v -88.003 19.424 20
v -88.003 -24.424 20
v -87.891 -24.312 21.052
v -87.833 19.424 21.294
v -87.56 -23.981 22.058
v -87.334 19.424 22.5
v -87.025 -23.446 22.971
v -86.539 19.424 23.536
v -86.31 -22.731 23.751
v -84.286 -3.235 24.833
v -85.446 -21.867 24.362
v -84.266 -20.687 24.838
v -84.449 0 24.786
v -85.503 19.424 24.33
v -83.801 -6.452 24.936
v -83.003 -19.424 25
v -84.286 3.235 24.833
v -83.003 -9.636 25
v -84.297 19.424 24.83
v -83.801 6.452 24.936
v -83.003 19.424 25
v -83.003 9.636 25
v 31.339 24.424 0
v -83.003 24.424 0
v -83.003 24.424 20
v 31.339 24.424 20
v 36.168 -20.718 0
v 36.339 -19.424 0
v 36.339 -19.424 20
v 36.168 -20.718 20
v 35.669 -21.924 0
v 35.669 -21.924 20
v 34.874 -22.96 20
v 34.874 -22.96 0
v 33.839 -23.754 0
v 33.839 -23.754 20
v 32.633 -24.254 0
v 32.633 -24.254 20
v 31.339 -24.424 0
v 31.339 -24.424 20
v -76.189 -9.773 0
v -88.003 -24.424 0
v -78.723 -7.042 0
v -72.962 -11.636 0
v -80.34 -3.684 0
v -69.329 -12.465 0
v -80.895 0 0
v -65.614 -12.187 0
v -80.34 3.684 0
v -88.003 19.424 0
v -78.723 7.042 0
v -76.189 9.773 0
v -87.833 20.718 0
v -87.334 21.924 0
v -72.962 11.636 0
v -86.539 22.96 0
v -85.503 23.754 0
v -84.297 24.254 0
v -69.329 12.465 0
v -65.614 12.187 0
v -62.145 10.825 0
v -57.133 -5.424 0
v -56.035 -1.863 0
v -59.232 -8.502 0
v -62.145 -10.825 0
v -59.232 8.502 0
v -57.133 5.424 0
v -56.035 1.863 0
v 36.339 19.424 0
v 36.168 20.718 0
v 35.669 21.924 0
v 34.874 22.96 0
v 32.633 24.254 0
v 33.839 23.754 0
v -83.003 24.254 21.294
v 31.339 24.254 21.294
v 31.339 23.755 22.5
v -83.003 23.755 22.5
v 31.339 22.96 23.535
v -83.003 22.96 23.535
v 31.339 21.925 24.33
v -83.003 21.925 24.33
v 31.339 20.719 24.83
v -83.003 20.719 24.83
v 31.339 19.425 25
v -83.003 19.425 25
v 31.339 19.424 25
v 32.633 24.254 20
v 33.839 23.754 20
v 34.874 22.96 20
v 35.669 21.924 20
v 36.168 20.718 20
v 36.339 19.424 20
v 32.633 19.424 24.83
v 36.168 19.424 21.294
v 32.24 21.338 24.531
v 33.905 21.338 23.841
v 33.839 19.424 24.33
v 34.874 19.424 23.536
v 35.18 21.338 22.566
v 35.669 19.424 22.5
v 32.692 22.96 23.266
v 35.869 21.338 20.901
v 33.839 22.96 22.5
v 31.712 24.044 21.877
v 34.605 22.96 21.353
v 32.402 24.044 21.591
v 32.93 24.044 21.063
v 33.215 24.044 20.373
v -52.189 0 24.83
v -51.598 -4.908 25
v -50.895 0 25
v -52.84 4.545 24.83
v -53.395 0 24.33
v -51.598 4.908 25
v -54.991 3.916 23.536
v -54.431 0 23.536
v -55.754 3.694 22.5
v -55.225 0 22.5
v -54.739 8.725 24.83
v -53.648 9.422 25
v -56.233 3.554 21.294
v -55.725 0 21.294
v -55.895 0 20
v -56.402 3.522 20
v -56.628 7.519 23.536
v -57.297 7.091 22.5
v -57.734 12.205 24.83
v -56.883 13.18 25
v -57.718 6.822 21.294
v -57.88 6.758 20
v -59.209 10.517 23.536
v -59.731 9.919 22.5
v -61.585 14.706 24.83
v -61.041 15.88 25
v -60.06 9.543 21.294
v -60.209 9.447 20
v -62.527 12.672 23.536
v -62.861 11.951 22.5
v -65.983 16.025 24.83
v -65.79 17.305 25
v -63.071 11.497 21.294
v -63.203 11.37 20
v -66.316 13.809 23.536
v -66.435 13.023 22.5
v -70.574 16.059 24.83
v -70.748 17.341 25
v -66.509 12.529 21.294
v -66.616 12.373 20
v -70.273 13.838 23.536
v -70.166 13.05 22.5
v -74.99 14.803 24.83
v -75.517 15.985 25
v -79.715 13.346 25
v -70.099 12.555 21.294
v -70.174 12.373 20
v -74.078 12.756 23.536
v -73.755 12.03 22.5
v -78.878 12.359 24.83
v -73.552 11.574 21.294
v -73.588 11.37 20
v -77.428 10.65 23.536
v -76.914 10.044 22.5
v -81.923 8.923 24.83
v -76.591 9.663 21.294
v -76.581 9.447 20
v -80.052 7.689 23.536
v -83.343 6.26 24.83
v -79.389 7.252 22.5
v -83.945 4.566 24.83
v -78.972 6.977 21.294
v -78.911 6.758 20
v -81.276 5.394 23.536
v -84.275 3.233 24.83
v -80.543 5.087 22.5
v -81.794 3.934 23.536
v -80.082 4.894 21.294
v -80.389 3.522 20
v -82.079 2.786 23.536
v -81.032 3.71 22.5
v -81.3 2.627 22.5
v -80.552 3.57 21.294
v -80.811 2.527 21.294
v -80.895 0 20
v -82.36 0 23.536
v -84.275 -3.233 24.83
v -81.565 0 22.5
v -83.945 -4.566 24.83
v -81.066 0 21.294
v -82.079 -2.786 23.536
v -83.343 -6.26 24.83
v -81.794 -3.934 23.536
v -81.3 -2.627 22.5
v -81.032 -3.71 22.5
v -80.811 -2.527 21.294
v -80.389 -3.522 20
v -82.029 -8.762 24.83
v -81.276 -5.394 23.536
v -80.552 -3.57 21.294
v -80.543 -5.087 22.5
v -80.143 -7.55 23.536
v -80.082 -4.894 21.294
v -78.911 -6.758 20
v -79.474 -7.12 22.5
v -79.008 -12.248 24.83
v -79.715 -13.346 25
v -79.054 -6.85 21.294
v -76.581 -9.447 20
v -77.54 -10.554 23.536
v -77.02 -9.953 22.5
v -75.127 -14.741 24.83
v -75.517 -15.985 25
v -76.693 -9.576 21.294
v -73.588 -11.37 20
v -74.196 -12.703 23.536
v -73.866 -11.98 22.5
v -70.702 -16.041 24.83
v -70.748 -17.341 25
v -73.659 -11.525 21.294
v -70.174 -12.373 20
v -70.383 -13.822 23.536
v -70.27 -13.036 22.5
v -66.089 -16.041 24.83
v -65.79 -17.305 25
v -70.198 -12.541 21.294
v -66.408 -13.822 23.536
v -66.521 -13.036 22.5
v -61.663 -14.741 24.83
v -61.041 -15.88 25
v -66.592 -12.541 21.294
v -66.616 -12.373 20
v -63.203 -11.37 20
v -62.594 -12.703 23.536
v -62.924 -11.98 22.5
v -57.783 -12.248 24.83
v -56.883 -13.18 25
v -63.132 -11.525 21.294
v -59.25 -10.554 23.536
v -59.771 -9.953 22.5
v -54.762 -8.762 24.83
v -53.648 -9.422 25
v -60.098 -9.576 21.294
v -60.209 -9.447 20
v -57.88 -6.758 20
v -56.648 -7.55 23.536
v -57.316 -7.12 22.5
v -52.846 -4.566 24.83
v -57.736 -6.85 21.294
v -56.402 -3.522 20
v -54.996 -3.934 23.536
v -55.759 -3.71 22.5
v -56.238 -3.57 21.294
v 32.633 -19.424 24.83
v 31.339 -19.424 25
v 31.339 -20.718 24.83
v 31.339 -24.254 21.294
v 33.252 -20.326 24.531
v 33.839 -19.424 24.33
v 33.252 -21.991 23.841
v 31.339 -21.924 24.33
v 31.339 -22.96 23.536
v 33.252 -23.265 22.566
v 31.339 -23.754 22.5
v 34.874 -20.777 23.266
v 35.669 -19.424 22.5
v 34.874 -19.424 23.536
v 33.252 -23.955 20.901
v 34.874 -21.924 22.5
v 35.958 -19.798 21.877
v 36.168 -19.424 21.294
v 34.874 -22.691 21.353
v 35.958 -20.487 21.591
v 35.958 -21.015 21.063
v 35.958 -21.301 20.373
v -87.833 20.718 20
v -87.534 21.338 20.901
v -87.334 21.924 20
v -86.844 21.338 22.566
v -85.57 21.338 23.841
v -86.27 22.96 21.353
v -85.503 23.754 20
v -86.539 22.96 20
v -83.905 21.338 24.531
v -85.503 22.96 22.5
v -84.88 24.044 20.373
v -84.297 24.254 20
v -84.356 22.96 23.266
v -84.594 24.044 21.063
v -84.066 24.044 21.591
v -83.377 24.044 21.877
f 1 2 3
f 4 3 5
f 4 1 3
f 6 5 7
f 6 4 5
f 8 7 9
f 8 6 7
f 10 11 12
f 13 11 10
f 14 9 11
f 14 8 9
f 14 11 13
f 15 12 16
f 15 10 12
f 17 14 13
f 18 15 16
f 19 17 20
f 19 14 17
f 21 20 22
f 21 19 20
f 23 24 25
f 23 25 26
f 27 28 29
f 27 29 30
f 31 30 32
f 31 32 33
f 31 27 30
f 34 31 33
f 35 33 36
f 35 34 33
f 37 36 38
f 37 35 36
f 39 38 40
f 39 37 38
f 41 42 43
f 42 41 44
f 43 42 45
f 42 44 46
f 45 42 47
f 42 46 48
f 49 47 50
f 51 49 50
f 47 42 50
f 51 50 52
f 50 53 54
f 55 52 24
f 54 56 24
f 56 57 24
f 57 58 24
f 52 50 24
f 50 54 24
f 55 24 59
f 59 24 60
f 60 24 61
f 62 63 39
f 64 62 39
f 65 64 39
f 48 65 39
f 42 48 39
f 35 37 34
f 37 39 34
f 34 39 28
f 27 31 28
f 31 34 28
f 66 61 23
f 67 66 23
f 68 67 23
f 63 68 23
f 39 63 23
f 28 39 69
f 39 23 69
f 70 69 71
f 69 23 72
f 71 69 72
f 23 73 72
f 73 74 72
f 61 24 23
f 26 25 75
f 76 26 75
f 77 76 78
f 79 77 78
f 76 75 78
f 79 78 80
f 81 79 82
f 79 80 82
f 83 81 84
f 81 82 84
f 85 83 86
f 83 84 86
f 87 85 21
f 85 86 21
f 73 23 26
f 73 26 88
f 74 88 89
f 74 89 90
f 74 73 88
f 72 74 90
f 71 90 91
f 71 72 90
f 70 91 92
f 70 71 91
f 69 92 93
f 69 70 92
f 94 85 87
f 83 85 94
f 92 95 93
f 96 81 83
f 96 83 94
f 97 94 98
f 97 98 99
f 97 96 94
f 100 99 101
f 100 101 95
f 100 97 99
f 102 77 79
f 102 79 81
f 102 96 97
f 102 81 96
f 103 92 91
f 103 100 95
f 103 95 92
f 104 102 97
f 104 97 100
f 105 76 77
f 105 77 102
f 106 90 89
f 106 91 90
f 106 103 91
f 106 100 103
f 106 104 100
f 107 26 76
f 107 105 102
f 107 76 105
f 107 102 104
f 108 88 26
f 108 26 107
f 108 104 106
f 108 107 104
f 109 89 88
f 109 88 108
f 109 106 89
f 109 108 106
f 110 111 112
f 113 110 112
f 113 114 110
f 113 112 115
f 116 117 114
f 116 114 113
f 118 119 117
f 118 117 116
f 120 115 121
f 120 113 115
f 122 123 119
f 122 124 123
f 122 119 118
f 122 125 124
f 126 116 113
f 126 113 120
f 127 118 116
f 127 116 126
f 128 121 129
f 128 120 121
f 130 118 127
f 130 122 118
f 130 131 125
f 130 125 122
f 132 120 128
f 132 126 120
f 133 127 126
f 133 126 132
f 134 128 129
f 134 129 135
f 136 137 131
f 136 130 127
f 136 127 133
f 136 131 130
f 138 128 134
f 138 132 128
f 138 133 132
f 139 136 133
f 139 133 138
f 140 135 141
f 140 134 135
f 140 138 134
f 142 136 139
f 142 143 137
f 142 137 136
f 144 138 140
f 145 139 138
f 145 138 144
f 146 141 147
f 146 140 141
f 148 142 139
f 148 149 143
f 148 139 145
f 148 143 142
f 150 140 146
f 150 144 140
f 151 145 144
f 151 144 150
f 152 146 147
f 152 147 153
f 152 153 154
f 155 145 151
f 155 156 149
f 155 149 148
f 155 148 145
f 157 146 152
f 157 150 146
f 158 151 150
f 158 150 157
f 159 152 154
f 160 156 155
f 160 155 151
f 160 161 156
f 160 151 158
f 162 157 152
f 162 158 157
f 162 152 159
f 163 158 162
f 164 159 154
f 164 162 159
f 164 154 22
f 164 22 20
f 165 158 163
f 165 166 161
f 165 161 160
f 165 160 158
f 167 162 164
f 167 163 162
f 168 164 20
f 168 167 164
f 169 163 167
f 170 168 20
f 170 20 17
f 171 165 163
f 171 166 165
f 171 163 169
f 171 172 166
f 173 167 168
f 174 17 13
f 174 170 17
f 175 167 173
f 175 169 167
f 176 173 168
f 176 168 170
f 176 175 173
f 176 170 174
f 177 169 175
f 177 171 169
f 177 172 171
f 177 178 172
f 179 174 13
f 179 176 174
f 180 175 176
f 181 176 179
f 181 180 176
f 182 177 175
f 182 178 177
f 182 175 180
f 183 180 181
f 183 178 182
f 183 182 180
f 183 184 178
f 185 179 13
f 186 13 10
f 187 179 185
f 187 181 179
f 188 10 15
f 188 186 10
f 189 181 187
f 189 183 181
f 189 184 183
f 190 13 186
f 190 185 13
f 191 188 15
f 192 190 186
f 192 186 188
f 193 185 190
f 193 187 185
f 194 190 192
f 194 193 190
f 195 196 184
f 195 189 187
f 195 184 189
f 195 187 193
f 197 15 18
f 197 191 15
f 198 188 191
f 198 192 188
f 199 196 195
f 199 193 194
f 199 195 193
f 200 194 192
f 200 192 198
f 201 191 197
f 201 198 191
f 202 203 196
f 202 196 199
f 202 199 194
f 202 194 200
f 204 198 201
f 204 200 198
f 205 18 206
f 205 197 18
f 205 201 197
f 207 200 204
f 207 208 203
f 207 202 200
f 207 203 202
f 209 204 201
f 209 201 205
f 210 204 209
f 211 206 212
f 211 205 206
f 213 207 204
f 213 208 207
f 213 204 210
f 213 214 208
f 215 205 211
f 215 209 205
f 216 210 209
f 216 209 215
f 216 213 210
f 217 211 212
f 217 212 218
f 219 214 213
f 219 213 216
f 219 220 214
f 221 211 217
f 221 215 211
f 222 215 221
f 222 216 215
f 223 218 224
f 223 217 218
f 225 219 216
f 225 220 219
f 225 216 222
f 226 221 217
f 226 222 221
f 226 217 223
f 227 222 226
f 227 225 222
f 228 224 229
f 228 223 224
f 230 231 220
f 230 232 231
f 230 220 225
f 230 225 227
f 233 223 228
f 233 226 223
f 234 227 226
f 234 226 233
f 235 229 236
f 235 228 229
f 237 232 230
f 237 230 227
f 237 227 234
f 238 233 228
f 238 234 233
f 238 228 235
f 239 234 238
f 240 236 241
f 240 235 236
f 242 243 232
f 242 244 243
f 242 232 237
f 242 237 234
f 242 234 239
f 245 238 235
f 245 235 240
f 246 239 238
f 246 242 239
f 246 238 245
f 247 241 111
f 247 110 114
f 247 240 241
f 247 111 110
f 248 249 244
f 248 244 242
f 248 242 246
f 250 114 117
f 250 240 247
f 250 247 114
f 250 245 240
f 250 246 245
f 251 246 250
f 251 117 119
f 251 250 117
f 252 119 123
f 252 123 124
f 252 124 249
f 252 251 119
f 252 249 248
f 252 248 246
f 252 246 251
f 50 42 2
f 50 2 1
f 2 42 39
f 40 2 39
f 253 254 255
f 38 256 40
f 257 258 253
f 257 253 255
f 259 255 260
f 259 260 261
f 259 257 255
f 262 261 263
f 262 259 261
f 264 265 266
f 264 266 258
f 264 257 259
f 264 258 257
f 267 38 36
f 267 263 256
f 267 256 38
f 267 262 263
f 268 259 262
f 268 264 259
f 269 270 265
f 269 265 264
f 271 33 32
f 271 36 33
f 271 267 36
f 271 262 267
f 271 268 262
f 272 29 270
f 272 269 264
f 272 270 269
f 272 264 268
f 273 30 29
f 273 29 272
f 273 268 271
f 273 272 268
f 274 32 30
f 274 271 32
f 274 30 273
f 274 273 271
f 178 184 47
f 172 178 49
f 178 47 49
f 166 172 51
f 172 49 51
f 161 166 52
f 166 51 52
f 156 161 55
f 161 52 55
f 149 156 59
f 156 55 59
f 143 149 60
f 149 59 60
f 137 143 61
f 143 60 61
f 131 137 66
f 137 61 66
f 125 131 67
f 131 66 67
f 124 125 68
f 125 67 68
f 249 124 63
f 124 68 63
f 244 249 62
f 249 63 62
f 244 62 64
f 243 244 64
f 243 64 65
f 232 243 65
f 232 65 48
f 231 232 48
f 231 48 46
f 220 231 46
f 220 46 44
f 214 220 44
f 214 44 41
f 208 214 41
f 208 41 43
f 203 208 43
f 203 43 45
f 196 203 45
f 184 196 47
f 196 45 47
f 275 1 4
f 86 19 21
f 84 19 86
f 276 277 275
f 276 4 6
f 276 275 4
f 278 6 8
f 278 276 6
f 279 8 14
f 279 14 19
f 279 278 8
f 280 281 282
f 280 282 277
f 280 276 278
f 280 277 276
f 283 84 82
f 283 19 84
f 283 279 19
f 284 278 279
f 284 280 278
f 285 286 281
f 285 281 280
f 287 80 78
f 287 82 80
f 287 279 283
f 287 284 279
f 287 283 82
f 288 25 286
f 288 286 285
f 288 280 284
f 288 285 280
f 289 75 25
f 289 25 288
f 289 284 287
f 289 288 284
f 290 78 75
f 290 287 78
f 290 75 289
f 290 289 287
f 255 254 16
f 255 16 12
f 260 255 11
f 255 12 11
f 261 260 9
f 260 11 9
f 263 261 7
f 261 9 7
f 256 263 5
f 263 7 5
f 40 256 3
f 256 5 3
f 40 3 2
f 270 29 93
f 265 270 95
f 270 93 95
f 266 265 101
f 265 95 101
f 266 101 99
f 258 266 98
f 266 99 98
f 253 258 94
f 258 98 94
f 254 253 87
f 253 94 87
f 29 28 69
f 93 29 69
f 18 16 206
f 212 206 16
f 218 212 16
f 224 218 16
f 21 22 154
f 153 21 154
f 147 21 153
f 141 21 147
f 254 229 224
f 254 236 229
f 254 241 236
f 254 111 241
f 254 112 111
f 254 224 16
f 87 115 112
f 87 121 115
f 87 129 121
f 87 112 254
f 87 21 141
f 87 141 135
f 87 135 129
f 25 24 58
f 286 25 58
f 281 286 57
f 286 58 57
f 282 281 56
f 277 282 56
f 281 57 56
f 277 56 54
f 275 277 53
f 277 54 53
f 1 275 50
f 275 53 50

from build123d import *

# Parameters (mm, degrees)
F0_W         = 124.3421025574
F0_H         = 48.8486886024
F1_DEPTH     = 25
F3_D         = 25
F4_T1_DEPTH  = 149.3421025574
F4_T3_DEPTH  = 73.8486886024
F5_T1_DEPTH  = 32.5
F5_S5_W      = 5
F5_S5_H      = 5
F5_T6_DEPTH  = 5
F6_T1_DEPTH  = 32.5
F6_S5_W      = 5
F6_S5_H      = 5
F6_T6_DEPTH  = 5
F6_S11_W     = 5
F6_S11_H     = 5
F6_T12_DEPTH = 5


# Not quite as in the source:
# - a fillet or chamfer that OpenCascade refuses, or shapes differently, is made with other operations: its cross-section is extruded or revolved along the edge and cut away or added


with BuildPart() as f1:
    # F0 (on Top) → F1 (new body)
    with BuildSketch(Plane.XY):
        with Locations((-25.8323382586, 0)):
            Rectangle(F0_W, F0_H)
    extrude(amount=F1_DEPTH)

    # F3 (through all)
    with Locations(Plane.XY.offset(25)):
        with Locations((-68.3952495456, 0)):
            Hole(F3_D / 2)

    # F4: fillet of radius 5 on 5 edges, made by hand

    # F4_s2 → F4_t1 (cut)
    with BuildSketch(Plane.YZ.offset(-100.5033895373)):
        with BuildLine():
            ThreePointArc((24.4243443012, 20), (22.9598782072, 23.5355339059), (19.4243443012, 25))
            Line((19.4243443012, 25), (24.4243443012, 25))
            Line((24.4243443012, 25), (24.4243443012, 20))
        make_face()
        with BuildLine():
            ThreePointArc((-19.4243443012, 25), (-22.9598782072, 23.5355339059), (-24.4243443012, 20))
            Line((-24.4243443012, 20), (-24.4243443012, 25))
            Line((-24.4243443012, 25), (-19.4243443012, 25))
        make_face()
    extrude(amount=F4_T1_DEPTH, mode=Mode.SUBTRACT)

    # F4_s4 → F4_t3 (cut)
    with BuildSketch(Plane.XZ.offset(-36.9243443012)):
        with BuildLine():
            ThreePointArc((36.3387130201, 20), (34.874246926, 23.5355339059), (31.3387130201, 25))
            Line((31.3387130201, 25), (36.3387130201, 25))
            Line((36.3387130201, 25), (36.3387130201, 20))
        make_face()
        with BuildLine():
            ThreePointArc((-88.0033895373, 20), (-86.5389234433, 23.5355339059), (-83.0033895373, 25))
            Line((-83.0033895373, 25), (-88.0033895373, 25))
            Line((-88.0033895373, 25), (-88.0033895373, 20))
        make_face()
    extrude(amount=F4_T3_DEPTH, mode=Mode.SUBTRACT)

    # F4_s5 → F4_t6 (revolve, cut)
    with BuildSketch(Plane.XZ):
        with BuildLine():
            ThreePointArc((-50.8952495456, 25), (-54.4307834515, 23.5355339059), (-55.8952495456, 20))
            Line((-55.8952495456, 20), (-55.8952495456, 25))
            Line((-55.8952495456, 25), (-50.8952495456, 25))
        make_face()
    revolve(axis=Axis((-68.3952495456, 0, 25), (0, 0, 1)), mode=Mode.SUBTRACT)

    # F5: fillet of radius 5 on 1 edges, made by hand

    # F5_s2 → F5_t1 (cut)
    with BuildSketch(Plane.XY.offset(-12.5)):
        with BuildLine():
            ThreePointArc((36.3387130201, -19.4243443012), (34.874246926, -22.9598782072), (31.3387130201, -24.4243443012))
            Line((31.3387130201, -24.4243443012), (36.3387130201, -24.4243443012))
            Line((36.3387130201, -24.4243443012), (36.3387130201, -19.4243443012))
        make_face()
    extrude(amount=F5_T1_DEPTH, mode=Mode.SUBTRACT)


with BuildPart() as f5_tool4:
    # F5_s5 → F5_t6 (new body)
    with BuildSketch(Plane.YZ.offset(31.3387130201)):
        with Locations((-21.9243443012, 22.5)):
            Rectangle(F5_S5_W, F5_S5_H)
    extrude(amount=F5_T6_DEPTH)

    # F5_s7 → F5_t8 (revolve, cut)
    with BuildSketch(Plane(origin=(31.3387130201, -19.4243443012, 20), x_dir=(0, 0.7071067812, -0.7071067812), z_dir=(0, -0.7071067812, -0.7071067812))):
        with BuildLine():
            ThreePointArc((0, -5), (5, 0), (0, 5))
            Line((0, 5), (0, -5))
        make_face()
    revolve(axis=Axis((31.3387130201, -19.4243443012, 20), (1, 0, 0)), mode=Mode.SUBTRACT)


with BuildPart() as f1_1:
    add(f1.part)

    # F5_t3: cut F5_tool4
    add(f5_tool4.part, mode=Mode.SUBTRACT)

    # F6: fillet of radius 5 on 2 edges, made by hand

    # F6_s2 → F6_t1 (cut)
    with BuildSketch(Plane.XY.offset(-12.5)):
        with BuildLine():
            ThreePointArc((-83.0033895373, 24.4243443012), (-86.5389234433, 22.9598782072), (-88.0033895373, 19.4243443012))
            Line((-88.0033895373, 19.4243443012), (-88.0033895373, 24.4243443012))
            Line((-88.0033895373, 24.4243443012), (-83.0033895373, 24.4243443012))
        make_face()
        with BuildLine():
            ThreePointArc((31.3387130201, 24.4243443012), (34.874246926, 22.9598782072), (36.3387130201, 19.4243443012))
            Line((36.3387130201, 19.4243443012), (36.3387130201, 24.4243443012))
            Line((36.3387130201, 24.4243443012), (31.3387130201, 24.4243443012))
        make_face()
    extrude(amount=F6_T1_DEPTH, mode=Mode.SUBTRACT)


with BuildPart() as f6_tool4:
    # F6_s5 → F6_t6 (new body)
    with BuildSketch(Plane.XZ.offset(-19.4243443012)):
        with Locations((33.8387130201, 22.5)):
            Rectangle(F6_S5_W, F6_S5_H)
    extrude(amount=-F6_T6_DEPTH)

    # F6_s7 → F6_t8 (revolve, cut)
    with BuildSketch(Plane(origin=(31.3387130201, 19.4243443012, 20), x_dir=(-0.7071067812, 0, -0.7071067812), z_dir=(0.7071067812, 0, -0.7071067812))):
        with BuildLine():
            ThreePointArc((0, -5), (5, 0), (0, 5))
            Line((0, 5), (0, -5))
        make_face()
    revolve(axis=Axis((31.3387130201, 19.4243443012, 20), (0, 1, 0)), mode=Mode.SUBTRACT)


with BuildPart() as f1_2:
    add(f1_1.part)

    # F6_t3: cut F6_tool4
    add(f6_tool4.part, mode=Mode.SUBTRACT)


with BuildPart() as f6_tool10:
    # F6_s11 → F6_t12 (new body)
    with BuildSketch(Plane.XZ.offset(-19.4243443012)):
        with Locations((-85.5033895373, 22.5)):
            Rectangle(F6_S11_W, F6_S11_H)
    extrude(amount=-F6_T12_DEPTH)

    # F6_s13 → F6_t14 (revolve, cut)
    with BuildSketch(Plane(origin=(-83.0033895373, 19.4243443012, 20), x_dir=(0.7071067812, 0, -0.7071067812), z_dir=(0.7071067812, 0, 0.7071067812))):
        with BuildLine():
            ThreePointArc((0, -5), (5, 0), (0, 5))
            Line((0, 5), (0, -5))
        make_face()
    revolve(axis=Axis((-83.0033895373, 19.4243443012, 20), (0, 1, 0)), mode=Mode.SUBTRACT)


with BuildPart() as f1_3:
    add(f1_2.part)

    # F6_t9: cut F6_tool10
    add(f6_tool10.part, mode=Mode.SUBTRACT)


solid = f1_3.part
